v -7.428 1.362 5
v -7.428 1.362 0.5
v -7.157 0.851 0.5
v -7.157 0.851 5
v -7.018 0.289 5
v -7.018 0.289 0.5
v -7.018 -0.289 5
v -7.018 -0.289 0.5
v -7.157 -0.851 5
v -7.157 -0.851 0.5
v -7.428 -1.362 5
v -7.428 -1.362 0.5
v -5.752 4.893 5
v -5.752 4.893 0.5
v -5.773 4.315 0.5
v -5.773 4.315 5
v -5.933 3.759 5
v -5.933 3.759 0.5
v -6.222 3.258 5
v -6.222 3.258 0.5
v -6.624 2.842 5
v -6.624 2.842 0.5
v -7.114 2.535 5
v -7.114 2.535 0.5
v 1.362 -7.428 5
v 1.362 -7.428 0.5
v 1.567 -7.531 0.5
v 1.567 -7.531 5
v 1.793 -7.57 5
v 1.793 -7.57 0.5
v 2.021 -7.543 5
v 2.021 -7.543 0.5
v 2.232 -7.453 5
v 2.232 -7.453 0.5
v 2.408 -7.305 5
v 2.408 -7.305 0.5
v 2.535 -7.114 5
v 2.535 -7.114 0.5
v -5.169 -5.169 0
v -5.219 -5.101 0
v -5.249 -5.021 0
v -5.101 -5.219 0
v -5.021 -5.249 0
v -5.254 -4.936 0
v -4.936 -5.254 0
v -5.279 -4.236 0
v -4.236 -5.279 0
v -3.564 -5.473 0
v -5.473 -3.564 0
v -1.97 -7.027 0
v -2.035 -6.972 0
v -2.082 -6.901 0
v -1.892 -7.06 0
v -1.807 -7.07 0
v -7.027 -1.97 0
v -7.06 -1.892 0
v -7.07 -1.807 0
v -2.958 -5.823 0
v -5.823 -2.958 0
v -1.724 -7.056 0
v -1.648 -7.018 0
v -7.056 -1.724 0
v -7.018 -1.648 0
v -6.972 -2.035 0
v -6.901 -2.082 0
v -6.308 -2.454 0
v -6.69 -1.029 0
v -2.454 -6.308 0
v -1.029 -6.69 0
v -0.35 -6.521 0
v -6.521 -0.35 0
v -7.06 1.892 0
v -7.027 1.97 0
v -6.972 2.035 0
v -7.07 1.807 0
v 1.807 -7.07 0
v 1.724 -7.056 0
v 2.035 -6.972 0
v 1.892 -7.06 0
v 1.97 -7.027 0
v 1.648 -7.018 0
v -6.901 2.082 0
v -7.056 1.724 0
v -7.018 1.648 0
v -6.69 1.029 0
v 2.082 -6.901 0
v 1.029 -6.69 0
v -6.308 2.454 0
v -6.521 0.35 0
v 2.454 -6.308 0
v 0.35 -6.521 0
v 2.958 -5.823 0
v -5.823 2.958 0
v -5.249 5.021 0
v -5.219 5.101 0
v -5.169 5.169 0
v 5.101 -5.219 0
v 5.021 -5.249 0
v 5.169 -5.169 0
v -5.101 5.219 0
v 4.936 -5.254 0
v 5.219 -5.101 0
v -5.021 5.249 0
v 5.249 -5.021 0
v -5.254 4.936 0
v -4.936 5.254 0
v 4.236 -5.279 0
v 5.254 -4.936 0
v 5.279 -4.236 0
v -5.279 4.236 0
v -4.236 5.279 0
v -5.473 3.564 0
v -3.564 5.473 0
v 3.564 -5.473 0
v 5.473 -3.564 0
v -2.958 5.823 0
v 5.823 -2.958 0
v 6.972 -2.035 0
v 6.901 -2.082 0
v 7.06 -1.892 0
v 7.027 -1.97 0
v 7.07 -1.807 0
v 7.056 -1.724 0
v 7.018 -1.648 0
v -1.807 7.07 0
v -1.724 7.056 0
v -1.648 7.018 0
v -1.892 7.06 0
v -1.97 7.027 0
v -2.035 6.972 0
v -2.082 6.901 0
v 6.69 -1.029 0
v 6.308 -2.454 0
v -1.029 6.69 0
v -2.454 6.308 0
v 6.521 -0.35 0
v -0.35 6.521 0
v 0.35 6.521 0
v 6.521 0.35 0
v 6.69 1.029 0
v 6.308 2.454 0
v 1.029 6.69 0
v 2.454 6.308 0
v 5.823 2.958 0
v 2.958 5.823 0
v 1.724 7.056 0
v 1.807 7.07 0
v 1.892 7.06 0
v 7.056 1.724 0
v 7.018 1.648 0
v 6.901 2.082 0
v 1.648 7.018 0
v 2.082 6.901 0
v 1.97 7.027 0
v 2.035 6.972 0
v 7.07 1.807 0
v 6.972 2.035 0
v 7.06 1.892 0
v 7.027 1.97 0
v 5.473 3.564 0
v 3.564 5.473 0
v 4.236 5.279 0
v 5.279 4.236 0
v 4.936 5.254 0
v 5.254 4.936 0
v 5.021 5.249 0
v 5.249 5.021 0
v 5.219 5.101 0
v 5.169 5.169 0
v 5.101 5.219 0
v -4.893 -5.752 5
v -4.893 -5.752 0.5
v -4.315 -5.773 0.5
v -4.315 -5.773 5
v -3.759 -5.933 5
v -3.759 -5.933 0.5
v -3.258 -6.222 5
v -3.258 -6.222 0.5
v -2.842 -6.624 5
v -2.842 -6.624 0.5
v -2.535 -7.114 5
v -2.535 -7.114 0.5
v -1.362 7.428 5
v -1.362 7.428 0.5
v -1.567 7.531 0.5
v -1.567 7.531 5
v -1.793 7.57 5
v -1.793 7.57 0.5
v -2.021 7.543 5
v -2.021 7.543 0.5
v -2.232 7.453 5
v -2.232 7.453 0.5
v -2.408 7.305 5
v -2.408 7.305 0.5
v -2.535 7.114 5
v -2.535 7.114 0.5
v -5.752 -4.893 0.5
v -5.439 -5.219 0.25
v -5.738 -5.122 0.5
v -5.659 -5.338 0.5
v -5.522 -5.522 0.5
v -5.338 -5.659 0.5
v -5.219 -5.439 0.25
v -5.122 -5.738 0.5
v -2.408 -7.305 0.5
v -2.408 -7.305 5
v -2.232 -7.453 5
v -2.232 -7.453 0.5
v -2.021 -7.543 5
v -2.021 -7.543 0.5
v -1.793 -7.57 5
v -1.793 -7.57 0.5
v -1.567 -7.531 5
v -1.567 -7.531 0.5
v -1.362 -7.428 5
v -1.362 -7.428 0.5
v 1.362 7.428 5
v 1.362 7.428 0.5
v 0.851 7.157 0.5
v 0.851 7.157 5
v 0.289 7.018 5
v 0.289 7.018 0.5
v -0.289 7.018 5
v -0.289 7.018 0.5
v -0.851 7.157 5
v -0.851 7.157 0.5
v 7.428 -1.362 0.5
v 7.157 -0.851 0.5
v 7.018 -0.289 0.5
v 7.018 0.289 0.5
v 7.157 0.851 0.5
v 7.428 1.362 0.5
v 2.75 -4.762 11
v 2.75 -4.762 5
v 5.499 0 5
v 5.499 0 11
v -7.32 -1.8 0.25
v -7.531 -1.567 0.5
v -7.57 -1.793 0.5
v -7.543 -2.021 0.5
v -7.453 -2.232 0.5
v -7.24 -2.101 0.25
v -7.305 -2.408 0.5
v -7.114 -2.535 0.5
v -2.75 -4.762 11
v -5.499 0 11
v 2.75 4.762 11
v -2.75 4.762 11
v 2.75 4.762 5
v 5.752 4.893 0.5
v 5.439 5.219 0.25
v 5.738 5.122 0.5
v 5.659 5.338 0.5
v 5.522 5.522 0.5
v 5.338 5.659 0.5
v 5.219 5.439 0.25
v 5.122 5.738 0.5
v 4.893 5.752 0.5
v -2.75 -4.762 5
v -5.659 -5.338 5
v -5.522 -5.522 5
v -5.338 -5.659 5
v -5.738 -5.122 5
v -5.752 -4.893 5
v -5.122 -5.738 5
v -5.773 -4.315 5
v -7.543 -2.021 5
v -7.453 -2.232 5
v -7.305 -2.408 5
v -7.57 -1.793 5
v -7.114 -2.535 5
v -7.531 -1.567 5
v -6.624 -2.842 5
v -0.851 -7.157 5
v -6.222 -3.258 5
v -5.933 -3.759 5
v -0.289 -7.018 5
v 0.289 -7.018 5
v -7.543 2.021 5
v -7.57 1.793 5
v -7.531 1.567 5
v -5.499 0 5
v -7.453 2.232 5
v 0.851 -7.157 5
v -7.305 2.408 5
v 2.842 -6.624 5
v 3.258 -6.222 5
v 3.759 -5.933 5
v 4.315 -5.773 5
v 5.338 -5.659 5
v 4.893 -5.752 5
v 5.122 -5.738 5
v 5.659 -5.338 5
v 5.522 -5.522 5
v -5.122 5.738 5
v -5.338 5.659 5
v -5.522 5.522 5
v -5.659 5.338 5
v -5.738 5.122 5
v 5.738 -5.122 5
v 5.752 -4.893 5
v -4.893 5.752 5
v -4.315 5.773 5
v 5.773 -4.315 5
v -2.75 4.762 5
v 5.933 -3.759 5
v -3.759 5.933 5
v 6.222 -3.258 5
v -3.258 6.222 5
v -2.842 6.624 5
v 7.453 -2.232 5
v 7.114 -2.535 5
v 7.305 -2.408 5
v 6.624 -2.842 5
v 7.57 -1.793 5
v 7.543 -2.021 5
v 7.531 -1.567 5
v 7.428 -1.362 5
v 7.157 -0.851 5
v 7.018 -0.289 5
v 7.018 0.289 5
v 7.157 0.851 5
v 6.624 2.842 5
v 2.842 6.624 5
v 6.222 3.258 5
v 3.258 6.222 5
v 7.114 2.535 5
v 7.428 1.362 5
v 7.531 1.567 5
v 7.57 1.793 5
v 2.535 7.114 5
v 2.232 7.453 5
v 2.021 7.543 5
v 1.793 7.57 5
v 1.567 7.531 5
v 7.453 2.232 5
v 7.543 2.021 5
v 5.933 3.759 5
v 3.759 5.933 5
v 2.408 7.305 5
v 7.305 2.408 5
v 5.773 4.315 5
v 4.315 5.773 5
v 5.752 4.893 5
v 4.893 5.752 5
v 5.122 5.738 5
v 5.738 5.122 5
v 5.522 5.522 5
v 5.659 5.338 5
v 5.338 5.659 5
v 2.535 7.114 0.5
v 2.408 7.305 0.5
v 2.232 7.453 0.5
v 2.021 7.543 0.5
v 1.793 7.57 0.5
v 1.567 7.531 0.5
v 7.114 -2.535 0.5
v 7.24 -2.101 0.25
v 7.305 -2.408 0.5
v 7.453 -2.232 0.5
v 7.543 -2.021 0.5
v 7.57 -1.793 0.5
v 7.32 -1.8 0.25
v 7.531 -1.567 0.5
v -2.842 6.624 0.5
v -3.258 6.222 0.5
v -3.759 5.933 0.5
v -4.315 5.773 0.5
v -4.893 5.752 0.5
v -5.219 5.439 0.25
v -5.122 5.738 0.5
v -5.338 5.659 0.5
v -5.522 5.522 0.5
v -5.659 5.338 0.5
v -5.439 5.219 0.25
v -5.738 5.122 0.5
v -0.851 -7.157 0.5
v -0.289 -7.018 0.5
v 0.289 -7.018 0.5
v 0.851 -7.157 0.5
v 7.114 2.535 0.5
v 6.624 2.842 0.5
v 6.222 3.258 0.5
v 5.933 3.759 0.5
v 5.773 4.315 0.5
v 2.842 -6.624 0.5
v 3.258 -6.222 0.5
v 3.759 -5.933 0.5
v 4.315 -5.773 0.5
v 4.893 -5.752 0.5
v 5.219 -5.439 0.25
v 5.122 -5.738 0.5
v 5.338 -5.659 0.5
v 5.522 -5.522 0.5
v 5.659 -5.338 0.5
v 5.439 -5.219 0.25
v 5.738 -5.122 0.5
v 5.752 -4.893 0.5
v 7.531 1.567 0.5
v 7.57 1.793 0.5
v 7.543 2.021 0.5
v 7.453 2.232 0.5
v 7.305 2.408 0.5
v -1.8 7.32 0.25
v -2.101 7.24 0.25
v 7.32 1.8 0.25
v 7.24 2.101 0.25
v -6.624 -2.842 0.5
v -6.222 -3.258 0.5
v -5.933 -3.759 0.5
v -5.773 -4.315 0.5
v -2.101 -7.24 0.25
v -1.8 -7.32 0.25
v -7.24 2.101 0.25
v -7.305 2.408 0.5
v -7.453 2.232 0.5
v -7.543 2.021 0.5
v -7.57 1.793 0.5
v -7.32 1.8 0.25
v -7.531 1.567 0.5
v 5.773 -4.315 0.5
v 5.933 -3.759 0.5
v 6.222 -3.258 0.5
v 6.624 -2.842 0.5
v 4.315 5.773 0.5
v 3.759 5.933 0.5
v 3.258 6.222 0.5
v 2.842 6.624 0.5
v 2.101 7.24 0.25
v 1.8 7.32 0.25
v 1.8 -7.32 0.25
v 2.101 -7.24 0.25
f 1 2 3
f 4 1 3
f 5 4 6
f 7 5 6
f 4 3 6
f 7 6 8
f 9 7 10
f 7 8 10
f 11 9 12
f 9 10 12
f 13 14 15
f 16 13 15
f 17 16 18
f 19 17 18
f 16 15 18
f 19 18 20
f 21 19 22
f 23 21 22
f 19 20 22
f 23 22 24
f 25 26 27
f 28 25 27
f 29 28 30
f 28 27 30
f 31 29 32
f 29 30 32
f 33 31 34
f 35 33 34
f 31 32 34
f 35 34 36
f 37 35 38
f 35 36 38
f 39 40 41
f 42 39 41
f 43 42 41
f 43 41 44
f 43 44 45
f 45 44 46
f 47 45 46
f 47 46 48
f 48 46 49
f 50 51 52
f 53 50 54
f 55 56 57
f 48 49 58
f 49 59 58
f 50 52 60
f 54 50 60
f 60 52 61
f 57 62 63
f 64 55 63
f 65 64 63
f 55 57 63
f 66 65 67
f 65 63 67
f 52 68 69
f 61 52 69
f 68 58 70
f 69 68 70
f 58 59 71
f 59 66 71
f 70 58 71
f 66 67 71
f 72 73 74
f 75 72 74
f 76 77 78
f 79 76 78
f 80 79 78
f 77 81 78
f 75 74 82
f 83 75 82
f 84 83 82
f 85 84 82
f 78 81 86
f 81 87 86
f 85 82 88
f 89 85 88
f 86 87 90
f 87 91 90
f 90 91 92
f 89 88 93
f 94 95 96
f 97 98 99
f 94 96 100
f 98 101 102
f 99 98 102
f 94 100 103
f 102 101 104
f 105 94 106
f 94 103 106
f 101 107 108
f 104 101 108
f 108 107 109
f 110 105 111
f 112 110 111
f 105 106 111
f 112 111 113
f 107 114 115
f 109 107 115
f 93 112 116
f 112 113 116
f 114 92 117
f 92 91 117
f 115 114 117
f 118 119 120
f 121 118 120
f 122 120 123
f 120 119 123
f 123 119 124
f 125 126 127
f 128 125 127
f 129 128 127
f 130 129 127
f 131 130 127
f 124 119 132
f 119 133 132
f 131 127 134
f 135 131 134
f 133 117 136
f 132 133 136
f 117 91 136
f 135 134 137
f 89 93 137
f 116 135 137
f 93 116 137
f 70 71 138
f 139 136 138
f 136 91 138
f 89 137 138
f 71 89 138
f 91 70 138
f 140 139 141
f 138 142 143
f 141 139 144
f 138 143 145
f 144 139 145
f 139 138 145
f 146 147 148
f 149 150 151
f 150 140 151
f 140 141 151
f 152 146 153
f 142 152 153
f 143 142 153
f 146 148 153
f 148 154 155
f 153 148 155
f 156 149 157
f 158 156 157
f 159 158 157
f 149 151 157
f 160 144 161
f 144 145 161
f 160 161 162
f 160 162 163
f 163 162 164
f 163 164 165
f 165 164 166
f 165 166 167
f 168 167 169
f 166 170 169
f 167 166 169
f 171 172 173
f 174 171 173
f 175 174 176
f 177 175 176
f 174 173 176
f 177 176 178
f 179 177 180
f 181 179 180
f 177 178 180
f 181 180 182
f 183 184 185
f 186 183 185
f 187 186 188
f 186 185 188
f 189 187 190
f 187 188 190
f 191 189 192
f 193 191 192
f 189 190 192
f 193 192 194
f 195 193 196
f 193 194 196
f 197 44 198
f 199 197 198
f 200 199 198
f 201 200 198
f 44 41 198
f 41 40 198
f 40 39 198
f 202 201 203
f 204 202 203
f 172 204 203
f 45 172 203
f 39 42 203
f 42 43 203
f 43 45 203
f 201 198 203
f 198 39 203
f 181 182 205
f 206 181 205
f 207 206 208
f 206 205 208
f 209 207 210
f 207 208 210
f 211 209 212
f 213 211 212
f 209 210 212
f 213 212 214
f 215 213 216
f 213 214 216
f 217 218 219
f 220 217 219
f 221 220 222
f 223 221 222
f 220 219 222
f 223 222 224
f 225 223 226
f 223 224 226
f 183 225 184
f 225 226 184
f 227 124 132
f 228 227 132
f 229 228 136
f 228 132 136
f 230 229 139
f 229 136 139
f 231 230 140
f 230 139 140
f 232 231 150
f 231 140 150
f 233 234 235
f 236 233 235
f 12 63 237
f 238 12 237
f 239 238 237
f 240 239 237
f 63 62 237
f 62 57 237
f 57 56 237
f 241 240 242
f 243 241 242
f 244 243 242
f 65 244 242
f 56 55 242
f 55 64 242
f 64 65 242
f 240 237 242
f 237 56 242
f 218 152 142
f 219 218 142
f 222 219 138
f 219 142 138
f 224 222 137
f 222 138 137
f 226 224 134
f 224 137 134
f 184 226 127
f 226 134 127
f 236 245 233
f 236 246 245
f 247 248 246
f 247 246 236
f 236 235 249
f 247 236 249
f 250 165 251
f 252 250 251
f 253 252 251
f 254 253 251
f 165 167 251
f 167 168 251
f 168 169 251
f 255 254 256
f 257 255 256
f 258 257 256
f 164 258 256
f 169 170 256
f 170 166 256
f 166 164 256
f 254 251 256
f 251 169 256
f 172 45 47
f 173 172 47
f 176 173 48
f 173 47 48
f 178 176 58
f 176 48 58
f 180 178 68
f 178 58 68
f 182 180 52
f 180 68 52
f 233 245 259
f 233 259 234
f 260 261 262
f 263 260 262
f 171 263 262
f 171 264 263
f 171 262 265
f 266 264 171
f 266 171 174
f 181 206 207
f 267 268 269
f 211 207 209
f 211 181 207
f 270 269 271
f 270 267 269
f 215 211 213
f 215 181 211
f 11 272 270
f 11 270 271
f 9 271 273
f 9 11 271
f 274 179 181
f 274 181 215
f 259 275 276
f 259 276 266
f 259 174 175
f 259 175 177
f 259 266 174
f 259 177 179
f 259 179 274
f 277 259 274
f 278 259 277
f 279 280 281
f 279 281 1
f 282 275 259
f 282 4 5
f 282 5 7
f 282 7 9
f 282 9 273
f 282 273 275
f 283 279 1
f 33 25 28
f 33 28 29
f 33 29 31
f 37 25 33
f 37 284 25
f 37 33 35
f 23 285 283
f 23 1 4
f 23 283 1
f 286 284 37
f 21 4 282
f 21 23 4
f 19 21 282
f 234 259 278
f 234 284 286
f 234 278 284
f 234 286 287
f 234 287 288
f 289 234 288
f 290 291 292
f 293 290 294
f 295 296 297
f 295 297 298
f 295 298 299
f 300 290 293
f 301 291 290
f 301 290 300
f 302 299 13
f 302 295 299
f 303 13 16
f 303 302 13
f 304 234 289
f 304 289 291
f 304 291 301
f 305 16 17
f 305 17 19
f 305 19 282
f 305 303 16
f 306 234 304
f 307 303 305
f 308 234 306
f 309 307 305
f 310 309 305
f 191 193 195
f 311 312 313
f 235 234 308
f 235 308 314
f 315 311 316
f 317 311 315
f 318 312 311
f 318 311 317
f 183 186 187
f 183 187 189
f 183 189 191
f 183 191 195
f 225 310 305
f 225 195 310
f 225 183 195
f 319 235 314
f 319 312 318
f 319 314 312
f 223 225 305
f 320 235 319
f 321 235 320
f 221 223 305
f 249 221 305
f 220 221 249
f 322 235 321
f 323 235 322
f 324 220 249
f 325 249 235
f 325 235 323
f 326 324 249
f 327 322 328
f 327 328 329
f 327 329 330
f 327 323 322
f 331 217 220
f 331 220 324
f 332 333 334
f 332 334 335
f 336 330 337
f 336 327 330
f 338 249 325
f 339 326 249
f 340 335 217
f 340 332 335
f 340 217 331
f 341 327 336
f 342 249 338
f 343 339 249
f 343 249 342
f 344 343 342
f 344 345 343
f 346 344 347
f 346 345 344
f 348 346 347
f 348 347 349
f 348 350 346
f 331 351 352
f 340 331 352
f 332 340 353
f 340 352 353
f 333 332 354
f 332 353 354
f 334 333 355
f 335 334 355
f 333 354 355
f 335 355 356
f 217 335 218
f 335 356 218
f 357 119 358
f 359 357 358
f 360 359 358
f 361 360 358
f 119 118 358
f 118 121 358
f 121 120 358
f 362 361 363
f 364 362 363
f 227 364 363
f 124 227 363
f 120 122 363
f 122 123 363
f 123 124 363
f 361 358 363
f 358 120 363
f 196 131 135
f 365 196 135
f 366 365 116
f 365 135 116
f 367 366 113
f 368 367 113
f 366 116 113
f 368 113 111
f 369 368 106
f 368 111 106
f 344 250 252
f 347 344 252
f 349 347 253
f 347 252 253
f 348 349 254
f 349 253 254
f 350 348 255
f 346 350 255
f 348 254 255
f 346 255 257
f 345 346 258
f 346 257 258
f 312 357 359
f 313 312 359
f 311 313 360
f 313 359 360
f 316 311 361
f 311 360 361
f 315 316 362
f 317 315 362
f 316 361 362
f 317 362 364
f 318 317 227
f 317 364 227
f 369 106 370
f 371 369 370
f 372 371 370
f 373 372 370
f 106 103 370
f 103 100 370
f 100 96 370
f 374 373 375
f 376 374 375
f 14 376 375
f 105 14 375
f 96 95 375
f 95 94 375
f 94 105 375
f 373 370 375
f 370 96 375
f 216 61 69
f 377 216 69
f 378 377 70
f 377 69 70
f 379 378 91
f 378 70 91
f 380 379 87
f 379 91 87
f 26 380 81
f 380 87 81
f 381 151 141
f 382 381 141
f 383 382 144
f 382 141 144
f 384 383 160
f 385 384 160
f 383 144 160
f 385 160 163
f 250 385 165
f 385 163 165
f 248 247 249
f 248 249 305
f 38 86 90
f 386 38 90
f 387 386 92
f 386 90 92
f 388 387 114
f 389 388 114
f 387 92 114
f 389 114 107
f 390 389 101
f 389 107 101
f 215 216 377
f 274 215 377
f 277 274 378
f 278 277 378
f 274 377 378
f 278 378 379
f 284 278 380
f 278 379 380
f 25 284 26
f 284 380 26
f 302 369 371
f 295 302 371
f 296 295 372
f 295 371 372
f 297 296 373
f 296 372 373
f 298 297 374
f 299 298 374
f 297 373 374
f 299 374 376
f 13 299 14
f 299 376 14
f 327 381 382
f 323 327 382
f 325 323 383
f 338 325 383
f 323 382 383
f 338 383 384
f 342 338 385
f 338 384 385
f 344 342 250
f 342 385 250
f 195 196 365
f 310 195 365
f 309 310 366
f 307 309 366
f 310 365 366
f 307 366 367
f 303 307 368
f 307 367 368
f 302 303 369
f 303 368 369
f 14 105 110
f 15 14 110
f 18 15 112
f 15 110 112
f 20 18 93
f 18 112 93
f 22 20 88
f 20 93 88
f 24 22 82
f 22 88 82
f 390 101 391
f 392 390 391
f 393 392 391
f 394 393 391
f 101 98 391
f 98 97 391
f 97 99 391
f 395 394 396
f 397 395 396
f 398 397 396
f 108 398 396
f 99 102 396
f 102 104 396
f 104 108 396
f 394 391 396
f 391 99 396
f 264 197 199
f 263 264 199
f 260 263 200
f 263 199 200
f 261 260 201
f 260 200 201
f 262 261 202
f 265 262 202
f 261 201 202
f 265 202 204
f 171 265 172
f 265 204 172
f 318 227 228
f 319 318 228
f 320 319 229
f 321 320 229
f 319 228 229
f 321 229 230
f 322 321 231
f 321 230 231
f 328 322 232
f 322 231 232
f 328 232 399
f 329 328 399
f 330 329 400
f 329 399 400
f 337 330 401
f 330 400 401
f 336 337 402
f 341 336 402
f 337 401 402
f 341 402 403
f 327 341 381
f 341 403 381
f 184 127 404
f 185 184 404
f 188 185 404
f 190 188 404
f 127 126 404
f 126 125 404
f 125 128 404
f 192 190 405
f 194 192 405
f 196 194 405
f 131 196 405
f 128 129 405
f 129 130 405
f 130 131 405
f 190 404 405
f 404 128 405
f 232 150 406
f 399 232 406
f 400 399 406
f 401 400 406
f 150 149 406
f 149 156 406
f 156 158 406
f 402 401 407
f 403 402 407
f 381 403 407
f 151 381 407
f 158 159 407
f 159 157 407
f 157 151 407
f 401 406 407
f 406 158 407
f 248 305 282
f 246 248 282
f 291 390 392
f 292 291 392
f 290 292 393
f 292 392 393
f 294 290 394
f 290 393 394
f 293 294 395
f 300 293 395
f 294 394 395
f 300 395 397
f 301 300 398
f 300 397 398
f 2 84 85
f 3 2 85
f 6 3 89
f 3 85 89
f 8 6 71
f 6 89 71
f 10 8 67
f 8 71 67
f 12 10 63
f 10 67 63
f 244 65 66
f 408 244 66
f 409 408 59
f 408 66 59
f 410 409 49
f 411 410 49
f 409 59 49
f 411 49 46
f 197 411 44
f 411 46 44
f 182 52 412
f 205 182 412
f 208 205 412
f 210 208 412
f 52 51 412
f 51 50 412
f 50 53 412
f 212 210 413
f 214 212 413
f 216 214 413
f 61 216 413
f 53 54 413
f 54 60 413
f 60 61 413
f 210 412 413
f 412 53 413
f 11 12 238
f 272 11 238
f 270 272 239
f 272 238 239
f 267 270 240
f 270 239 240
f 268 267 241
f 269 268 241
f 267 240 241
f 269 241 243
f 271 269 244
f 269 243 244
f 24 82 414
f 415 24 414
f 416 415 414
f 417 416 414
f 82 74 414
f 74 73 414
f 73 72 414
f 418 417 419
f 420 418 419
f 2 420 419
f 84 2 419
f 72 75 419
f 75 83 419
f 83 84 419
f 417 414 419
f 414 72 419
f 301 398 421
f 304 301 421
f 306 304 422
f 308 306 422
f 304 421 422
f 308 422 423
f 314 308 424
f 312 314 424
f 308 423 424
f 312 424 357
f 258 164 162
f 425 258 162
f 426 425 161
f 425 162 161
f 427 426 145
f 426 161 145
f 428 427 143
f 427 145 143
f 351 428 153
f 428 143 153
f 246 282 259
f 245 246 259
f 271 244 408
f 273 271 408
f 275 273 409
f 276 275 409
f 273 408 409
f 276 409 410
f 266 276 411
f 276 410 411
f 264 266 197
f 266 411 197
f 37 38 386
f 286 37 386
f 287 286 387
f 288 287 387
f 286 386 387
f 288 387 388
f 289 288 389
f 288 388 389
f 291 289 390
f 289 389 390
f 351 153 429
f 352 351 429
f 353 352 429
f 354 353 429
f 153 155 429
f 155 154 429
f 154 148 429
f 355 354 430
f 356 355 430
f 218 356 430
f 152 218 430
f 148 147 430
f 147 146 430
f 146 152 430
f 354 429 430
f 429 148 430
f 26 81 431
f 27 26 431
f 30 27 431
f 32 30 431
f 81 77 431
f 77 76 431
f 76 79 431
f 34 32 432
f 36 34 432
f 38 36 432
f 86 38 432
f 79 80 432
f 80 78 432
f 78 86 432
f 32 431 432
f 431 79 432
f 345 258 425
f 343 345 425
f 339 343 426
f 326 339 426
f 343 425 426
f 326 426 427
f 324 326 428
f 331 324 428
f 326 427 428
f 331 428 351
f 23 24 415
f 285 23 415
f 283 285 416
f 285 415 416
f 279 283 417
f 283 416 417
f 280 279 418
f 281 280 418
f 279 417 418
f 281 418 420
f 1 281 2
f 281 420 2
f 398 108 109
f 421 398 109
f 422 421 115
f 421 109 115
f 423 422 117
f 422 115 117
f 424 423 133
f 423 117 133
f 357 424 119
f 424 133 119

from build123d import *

# Parameters (mm, degrees)
F1_DEPTH = 5
F3_DEPTH = 6
F4_SIZE  = 0.5


with BuildPart() as f1:
    # F0 (on Top) → F1 (new body)
    with BuildSketch(Plane.XY):
        with BuildLine():
            ThreePointArc((1.361869, 7.427878), (0, 7), (-1.361869, 7.427878))
            ThreePointArc((-1.361869, 7.427878), (-2.021263, 7.543457), (-2.534525, 7.113665))
            ThreePointArc((-2.534525, 7.113665), (-3.5, 6.062178), (-4.893352, 5.751796))
            ThreePointArc((-4.893352, 5.751796), (-5.522194, 5.522194), (-5.751796, 4.893352))
            ThreePointArc((-5.751796, 4.893352), (-6.062178, 3.5), (-7.113665, 2.534525))
            ThreePointArc((-7.113665, 2.534525), (-7.543457, 2.021263), (-7.427878, 1.361869))
            ThreePointArc((-7.427878, 1.361869), (-7, 0), (-7.427878, -1.361869))
            ThreePointArc((-7.427878, -1.361869), (-7.543457, -2.021263), (-7.113665, -2.534525))
            ThreePointArc((-7.113665, -2.534525), (-6.062178, -3.5), (-5.751796, -4.893352))
            ThreePointArc((-5.751796, -4.893352), (-5.522194, -5.522194), (-4.893352, -5.751796))
            ThreePointArc((-4.893352, -5.751796), (-3.5, -6.062178), (-2.534525, -7.113665))
            ThreePointArc((-2.534525, -7.113665), (-2.021263, -7.543457), (-1.361869, -7.427878))
            ThreePointArc((-1.361869, -7.427878), (0, -7), (1.361869, -7.427878))
            ThreePointArc((1.361869, -7.427878), (2.021263, -7.543457), (2.534525, -7.113665))
            ThreePointArc((2.534525, -7.113665), (3.5, -6.062178), (4.893352, -5.751796))
            ThreePointArc((4.893352, -5.751796), (5.522194, -5.522194), (5.751796, -4.893352))
            ThreePointArc((5.751796, -4.893352), (6.062178, -3.5), (7.113665, -2.534525))
            ThreePointArc((7.113665, -2.534525), (7.543457, -2.021263), (7.427878, -1.361869))
            ThreePointArc((7.427878, -1.361869), (7, 0), (7.427878, 1.361869))
            ThreePointArc((7.427878, 1.361869), (7.543457, 2.021263), (7.113665, 2.534525))
            ThreePointArc((7.113665, 2.534525), (6.062178, 3.5), (5.751796, 4.893352))
            ThreePointArc((5.751796, 4.893352), (5.522194, 5.522194), (4.893352, 5.751796))
            ThreePointArc((4.893352, 5.751796), (3.5, 6.062178), (2.534525, 7.113665))
            ThreePointArc((2.534525, 7.113665), (2.021263, 7.543457), (1.361869, 7.427878))
        make_face()
    extrude(amount=F1_DEPTH)

    # F2 (on face) → F3 (join)
    with BuildSketch(Plane.XY.offset(5)):
        Polygon((-2.749631, -4.7625), (2.749631, -4.7625), (5.499261, 0), (2.749631, 4.7625), (-2.749631, 4.7625), (-5.499261, 0), align=None)
    extrude(amount=F3_DEPTH)

    # F4
    f4_edges = [f1.edges().sort_by_distance(p)[0] for p in [
        (2.021263, 7.543457, 0),
        (0, 7, 0),
        (-2.021263, 7.543457, 0),
        (-3.5, 6.062178, 0),
        (-5.522194, 5.522194, 0),
        (-6.062178, 3.5, 0),
        (-7.543457, 2.021263, 0),
        (-7, 0, 0),
        (-7.543457, -2.021263, 0),
        (-6.062178, -3.5, 0),
        (-5.522194, -5.522194, 0),
        (-3.5, -6.062178, 0),
        (-2.021263, -7.543457, 0),
        (0, -7, 0),
        (2.021263, -7.543457, 0),
        (3.5, -6.062178, 0),
        (5.522194, -5.522194, 0),
        (6.062178, -3.5, 0),
        (7.543457, -2.021263, 0),
        (7, 0, 0),
        (7.543457, 2.021263, 0),
        (6.062178, 3.5, 0),
        (5.522194, 5.522194, 0),
        (3.5, 6.062178, 0),
    ]]
    chamfer(f4_edges, length=F4_SIZE)


solid = f1.part
